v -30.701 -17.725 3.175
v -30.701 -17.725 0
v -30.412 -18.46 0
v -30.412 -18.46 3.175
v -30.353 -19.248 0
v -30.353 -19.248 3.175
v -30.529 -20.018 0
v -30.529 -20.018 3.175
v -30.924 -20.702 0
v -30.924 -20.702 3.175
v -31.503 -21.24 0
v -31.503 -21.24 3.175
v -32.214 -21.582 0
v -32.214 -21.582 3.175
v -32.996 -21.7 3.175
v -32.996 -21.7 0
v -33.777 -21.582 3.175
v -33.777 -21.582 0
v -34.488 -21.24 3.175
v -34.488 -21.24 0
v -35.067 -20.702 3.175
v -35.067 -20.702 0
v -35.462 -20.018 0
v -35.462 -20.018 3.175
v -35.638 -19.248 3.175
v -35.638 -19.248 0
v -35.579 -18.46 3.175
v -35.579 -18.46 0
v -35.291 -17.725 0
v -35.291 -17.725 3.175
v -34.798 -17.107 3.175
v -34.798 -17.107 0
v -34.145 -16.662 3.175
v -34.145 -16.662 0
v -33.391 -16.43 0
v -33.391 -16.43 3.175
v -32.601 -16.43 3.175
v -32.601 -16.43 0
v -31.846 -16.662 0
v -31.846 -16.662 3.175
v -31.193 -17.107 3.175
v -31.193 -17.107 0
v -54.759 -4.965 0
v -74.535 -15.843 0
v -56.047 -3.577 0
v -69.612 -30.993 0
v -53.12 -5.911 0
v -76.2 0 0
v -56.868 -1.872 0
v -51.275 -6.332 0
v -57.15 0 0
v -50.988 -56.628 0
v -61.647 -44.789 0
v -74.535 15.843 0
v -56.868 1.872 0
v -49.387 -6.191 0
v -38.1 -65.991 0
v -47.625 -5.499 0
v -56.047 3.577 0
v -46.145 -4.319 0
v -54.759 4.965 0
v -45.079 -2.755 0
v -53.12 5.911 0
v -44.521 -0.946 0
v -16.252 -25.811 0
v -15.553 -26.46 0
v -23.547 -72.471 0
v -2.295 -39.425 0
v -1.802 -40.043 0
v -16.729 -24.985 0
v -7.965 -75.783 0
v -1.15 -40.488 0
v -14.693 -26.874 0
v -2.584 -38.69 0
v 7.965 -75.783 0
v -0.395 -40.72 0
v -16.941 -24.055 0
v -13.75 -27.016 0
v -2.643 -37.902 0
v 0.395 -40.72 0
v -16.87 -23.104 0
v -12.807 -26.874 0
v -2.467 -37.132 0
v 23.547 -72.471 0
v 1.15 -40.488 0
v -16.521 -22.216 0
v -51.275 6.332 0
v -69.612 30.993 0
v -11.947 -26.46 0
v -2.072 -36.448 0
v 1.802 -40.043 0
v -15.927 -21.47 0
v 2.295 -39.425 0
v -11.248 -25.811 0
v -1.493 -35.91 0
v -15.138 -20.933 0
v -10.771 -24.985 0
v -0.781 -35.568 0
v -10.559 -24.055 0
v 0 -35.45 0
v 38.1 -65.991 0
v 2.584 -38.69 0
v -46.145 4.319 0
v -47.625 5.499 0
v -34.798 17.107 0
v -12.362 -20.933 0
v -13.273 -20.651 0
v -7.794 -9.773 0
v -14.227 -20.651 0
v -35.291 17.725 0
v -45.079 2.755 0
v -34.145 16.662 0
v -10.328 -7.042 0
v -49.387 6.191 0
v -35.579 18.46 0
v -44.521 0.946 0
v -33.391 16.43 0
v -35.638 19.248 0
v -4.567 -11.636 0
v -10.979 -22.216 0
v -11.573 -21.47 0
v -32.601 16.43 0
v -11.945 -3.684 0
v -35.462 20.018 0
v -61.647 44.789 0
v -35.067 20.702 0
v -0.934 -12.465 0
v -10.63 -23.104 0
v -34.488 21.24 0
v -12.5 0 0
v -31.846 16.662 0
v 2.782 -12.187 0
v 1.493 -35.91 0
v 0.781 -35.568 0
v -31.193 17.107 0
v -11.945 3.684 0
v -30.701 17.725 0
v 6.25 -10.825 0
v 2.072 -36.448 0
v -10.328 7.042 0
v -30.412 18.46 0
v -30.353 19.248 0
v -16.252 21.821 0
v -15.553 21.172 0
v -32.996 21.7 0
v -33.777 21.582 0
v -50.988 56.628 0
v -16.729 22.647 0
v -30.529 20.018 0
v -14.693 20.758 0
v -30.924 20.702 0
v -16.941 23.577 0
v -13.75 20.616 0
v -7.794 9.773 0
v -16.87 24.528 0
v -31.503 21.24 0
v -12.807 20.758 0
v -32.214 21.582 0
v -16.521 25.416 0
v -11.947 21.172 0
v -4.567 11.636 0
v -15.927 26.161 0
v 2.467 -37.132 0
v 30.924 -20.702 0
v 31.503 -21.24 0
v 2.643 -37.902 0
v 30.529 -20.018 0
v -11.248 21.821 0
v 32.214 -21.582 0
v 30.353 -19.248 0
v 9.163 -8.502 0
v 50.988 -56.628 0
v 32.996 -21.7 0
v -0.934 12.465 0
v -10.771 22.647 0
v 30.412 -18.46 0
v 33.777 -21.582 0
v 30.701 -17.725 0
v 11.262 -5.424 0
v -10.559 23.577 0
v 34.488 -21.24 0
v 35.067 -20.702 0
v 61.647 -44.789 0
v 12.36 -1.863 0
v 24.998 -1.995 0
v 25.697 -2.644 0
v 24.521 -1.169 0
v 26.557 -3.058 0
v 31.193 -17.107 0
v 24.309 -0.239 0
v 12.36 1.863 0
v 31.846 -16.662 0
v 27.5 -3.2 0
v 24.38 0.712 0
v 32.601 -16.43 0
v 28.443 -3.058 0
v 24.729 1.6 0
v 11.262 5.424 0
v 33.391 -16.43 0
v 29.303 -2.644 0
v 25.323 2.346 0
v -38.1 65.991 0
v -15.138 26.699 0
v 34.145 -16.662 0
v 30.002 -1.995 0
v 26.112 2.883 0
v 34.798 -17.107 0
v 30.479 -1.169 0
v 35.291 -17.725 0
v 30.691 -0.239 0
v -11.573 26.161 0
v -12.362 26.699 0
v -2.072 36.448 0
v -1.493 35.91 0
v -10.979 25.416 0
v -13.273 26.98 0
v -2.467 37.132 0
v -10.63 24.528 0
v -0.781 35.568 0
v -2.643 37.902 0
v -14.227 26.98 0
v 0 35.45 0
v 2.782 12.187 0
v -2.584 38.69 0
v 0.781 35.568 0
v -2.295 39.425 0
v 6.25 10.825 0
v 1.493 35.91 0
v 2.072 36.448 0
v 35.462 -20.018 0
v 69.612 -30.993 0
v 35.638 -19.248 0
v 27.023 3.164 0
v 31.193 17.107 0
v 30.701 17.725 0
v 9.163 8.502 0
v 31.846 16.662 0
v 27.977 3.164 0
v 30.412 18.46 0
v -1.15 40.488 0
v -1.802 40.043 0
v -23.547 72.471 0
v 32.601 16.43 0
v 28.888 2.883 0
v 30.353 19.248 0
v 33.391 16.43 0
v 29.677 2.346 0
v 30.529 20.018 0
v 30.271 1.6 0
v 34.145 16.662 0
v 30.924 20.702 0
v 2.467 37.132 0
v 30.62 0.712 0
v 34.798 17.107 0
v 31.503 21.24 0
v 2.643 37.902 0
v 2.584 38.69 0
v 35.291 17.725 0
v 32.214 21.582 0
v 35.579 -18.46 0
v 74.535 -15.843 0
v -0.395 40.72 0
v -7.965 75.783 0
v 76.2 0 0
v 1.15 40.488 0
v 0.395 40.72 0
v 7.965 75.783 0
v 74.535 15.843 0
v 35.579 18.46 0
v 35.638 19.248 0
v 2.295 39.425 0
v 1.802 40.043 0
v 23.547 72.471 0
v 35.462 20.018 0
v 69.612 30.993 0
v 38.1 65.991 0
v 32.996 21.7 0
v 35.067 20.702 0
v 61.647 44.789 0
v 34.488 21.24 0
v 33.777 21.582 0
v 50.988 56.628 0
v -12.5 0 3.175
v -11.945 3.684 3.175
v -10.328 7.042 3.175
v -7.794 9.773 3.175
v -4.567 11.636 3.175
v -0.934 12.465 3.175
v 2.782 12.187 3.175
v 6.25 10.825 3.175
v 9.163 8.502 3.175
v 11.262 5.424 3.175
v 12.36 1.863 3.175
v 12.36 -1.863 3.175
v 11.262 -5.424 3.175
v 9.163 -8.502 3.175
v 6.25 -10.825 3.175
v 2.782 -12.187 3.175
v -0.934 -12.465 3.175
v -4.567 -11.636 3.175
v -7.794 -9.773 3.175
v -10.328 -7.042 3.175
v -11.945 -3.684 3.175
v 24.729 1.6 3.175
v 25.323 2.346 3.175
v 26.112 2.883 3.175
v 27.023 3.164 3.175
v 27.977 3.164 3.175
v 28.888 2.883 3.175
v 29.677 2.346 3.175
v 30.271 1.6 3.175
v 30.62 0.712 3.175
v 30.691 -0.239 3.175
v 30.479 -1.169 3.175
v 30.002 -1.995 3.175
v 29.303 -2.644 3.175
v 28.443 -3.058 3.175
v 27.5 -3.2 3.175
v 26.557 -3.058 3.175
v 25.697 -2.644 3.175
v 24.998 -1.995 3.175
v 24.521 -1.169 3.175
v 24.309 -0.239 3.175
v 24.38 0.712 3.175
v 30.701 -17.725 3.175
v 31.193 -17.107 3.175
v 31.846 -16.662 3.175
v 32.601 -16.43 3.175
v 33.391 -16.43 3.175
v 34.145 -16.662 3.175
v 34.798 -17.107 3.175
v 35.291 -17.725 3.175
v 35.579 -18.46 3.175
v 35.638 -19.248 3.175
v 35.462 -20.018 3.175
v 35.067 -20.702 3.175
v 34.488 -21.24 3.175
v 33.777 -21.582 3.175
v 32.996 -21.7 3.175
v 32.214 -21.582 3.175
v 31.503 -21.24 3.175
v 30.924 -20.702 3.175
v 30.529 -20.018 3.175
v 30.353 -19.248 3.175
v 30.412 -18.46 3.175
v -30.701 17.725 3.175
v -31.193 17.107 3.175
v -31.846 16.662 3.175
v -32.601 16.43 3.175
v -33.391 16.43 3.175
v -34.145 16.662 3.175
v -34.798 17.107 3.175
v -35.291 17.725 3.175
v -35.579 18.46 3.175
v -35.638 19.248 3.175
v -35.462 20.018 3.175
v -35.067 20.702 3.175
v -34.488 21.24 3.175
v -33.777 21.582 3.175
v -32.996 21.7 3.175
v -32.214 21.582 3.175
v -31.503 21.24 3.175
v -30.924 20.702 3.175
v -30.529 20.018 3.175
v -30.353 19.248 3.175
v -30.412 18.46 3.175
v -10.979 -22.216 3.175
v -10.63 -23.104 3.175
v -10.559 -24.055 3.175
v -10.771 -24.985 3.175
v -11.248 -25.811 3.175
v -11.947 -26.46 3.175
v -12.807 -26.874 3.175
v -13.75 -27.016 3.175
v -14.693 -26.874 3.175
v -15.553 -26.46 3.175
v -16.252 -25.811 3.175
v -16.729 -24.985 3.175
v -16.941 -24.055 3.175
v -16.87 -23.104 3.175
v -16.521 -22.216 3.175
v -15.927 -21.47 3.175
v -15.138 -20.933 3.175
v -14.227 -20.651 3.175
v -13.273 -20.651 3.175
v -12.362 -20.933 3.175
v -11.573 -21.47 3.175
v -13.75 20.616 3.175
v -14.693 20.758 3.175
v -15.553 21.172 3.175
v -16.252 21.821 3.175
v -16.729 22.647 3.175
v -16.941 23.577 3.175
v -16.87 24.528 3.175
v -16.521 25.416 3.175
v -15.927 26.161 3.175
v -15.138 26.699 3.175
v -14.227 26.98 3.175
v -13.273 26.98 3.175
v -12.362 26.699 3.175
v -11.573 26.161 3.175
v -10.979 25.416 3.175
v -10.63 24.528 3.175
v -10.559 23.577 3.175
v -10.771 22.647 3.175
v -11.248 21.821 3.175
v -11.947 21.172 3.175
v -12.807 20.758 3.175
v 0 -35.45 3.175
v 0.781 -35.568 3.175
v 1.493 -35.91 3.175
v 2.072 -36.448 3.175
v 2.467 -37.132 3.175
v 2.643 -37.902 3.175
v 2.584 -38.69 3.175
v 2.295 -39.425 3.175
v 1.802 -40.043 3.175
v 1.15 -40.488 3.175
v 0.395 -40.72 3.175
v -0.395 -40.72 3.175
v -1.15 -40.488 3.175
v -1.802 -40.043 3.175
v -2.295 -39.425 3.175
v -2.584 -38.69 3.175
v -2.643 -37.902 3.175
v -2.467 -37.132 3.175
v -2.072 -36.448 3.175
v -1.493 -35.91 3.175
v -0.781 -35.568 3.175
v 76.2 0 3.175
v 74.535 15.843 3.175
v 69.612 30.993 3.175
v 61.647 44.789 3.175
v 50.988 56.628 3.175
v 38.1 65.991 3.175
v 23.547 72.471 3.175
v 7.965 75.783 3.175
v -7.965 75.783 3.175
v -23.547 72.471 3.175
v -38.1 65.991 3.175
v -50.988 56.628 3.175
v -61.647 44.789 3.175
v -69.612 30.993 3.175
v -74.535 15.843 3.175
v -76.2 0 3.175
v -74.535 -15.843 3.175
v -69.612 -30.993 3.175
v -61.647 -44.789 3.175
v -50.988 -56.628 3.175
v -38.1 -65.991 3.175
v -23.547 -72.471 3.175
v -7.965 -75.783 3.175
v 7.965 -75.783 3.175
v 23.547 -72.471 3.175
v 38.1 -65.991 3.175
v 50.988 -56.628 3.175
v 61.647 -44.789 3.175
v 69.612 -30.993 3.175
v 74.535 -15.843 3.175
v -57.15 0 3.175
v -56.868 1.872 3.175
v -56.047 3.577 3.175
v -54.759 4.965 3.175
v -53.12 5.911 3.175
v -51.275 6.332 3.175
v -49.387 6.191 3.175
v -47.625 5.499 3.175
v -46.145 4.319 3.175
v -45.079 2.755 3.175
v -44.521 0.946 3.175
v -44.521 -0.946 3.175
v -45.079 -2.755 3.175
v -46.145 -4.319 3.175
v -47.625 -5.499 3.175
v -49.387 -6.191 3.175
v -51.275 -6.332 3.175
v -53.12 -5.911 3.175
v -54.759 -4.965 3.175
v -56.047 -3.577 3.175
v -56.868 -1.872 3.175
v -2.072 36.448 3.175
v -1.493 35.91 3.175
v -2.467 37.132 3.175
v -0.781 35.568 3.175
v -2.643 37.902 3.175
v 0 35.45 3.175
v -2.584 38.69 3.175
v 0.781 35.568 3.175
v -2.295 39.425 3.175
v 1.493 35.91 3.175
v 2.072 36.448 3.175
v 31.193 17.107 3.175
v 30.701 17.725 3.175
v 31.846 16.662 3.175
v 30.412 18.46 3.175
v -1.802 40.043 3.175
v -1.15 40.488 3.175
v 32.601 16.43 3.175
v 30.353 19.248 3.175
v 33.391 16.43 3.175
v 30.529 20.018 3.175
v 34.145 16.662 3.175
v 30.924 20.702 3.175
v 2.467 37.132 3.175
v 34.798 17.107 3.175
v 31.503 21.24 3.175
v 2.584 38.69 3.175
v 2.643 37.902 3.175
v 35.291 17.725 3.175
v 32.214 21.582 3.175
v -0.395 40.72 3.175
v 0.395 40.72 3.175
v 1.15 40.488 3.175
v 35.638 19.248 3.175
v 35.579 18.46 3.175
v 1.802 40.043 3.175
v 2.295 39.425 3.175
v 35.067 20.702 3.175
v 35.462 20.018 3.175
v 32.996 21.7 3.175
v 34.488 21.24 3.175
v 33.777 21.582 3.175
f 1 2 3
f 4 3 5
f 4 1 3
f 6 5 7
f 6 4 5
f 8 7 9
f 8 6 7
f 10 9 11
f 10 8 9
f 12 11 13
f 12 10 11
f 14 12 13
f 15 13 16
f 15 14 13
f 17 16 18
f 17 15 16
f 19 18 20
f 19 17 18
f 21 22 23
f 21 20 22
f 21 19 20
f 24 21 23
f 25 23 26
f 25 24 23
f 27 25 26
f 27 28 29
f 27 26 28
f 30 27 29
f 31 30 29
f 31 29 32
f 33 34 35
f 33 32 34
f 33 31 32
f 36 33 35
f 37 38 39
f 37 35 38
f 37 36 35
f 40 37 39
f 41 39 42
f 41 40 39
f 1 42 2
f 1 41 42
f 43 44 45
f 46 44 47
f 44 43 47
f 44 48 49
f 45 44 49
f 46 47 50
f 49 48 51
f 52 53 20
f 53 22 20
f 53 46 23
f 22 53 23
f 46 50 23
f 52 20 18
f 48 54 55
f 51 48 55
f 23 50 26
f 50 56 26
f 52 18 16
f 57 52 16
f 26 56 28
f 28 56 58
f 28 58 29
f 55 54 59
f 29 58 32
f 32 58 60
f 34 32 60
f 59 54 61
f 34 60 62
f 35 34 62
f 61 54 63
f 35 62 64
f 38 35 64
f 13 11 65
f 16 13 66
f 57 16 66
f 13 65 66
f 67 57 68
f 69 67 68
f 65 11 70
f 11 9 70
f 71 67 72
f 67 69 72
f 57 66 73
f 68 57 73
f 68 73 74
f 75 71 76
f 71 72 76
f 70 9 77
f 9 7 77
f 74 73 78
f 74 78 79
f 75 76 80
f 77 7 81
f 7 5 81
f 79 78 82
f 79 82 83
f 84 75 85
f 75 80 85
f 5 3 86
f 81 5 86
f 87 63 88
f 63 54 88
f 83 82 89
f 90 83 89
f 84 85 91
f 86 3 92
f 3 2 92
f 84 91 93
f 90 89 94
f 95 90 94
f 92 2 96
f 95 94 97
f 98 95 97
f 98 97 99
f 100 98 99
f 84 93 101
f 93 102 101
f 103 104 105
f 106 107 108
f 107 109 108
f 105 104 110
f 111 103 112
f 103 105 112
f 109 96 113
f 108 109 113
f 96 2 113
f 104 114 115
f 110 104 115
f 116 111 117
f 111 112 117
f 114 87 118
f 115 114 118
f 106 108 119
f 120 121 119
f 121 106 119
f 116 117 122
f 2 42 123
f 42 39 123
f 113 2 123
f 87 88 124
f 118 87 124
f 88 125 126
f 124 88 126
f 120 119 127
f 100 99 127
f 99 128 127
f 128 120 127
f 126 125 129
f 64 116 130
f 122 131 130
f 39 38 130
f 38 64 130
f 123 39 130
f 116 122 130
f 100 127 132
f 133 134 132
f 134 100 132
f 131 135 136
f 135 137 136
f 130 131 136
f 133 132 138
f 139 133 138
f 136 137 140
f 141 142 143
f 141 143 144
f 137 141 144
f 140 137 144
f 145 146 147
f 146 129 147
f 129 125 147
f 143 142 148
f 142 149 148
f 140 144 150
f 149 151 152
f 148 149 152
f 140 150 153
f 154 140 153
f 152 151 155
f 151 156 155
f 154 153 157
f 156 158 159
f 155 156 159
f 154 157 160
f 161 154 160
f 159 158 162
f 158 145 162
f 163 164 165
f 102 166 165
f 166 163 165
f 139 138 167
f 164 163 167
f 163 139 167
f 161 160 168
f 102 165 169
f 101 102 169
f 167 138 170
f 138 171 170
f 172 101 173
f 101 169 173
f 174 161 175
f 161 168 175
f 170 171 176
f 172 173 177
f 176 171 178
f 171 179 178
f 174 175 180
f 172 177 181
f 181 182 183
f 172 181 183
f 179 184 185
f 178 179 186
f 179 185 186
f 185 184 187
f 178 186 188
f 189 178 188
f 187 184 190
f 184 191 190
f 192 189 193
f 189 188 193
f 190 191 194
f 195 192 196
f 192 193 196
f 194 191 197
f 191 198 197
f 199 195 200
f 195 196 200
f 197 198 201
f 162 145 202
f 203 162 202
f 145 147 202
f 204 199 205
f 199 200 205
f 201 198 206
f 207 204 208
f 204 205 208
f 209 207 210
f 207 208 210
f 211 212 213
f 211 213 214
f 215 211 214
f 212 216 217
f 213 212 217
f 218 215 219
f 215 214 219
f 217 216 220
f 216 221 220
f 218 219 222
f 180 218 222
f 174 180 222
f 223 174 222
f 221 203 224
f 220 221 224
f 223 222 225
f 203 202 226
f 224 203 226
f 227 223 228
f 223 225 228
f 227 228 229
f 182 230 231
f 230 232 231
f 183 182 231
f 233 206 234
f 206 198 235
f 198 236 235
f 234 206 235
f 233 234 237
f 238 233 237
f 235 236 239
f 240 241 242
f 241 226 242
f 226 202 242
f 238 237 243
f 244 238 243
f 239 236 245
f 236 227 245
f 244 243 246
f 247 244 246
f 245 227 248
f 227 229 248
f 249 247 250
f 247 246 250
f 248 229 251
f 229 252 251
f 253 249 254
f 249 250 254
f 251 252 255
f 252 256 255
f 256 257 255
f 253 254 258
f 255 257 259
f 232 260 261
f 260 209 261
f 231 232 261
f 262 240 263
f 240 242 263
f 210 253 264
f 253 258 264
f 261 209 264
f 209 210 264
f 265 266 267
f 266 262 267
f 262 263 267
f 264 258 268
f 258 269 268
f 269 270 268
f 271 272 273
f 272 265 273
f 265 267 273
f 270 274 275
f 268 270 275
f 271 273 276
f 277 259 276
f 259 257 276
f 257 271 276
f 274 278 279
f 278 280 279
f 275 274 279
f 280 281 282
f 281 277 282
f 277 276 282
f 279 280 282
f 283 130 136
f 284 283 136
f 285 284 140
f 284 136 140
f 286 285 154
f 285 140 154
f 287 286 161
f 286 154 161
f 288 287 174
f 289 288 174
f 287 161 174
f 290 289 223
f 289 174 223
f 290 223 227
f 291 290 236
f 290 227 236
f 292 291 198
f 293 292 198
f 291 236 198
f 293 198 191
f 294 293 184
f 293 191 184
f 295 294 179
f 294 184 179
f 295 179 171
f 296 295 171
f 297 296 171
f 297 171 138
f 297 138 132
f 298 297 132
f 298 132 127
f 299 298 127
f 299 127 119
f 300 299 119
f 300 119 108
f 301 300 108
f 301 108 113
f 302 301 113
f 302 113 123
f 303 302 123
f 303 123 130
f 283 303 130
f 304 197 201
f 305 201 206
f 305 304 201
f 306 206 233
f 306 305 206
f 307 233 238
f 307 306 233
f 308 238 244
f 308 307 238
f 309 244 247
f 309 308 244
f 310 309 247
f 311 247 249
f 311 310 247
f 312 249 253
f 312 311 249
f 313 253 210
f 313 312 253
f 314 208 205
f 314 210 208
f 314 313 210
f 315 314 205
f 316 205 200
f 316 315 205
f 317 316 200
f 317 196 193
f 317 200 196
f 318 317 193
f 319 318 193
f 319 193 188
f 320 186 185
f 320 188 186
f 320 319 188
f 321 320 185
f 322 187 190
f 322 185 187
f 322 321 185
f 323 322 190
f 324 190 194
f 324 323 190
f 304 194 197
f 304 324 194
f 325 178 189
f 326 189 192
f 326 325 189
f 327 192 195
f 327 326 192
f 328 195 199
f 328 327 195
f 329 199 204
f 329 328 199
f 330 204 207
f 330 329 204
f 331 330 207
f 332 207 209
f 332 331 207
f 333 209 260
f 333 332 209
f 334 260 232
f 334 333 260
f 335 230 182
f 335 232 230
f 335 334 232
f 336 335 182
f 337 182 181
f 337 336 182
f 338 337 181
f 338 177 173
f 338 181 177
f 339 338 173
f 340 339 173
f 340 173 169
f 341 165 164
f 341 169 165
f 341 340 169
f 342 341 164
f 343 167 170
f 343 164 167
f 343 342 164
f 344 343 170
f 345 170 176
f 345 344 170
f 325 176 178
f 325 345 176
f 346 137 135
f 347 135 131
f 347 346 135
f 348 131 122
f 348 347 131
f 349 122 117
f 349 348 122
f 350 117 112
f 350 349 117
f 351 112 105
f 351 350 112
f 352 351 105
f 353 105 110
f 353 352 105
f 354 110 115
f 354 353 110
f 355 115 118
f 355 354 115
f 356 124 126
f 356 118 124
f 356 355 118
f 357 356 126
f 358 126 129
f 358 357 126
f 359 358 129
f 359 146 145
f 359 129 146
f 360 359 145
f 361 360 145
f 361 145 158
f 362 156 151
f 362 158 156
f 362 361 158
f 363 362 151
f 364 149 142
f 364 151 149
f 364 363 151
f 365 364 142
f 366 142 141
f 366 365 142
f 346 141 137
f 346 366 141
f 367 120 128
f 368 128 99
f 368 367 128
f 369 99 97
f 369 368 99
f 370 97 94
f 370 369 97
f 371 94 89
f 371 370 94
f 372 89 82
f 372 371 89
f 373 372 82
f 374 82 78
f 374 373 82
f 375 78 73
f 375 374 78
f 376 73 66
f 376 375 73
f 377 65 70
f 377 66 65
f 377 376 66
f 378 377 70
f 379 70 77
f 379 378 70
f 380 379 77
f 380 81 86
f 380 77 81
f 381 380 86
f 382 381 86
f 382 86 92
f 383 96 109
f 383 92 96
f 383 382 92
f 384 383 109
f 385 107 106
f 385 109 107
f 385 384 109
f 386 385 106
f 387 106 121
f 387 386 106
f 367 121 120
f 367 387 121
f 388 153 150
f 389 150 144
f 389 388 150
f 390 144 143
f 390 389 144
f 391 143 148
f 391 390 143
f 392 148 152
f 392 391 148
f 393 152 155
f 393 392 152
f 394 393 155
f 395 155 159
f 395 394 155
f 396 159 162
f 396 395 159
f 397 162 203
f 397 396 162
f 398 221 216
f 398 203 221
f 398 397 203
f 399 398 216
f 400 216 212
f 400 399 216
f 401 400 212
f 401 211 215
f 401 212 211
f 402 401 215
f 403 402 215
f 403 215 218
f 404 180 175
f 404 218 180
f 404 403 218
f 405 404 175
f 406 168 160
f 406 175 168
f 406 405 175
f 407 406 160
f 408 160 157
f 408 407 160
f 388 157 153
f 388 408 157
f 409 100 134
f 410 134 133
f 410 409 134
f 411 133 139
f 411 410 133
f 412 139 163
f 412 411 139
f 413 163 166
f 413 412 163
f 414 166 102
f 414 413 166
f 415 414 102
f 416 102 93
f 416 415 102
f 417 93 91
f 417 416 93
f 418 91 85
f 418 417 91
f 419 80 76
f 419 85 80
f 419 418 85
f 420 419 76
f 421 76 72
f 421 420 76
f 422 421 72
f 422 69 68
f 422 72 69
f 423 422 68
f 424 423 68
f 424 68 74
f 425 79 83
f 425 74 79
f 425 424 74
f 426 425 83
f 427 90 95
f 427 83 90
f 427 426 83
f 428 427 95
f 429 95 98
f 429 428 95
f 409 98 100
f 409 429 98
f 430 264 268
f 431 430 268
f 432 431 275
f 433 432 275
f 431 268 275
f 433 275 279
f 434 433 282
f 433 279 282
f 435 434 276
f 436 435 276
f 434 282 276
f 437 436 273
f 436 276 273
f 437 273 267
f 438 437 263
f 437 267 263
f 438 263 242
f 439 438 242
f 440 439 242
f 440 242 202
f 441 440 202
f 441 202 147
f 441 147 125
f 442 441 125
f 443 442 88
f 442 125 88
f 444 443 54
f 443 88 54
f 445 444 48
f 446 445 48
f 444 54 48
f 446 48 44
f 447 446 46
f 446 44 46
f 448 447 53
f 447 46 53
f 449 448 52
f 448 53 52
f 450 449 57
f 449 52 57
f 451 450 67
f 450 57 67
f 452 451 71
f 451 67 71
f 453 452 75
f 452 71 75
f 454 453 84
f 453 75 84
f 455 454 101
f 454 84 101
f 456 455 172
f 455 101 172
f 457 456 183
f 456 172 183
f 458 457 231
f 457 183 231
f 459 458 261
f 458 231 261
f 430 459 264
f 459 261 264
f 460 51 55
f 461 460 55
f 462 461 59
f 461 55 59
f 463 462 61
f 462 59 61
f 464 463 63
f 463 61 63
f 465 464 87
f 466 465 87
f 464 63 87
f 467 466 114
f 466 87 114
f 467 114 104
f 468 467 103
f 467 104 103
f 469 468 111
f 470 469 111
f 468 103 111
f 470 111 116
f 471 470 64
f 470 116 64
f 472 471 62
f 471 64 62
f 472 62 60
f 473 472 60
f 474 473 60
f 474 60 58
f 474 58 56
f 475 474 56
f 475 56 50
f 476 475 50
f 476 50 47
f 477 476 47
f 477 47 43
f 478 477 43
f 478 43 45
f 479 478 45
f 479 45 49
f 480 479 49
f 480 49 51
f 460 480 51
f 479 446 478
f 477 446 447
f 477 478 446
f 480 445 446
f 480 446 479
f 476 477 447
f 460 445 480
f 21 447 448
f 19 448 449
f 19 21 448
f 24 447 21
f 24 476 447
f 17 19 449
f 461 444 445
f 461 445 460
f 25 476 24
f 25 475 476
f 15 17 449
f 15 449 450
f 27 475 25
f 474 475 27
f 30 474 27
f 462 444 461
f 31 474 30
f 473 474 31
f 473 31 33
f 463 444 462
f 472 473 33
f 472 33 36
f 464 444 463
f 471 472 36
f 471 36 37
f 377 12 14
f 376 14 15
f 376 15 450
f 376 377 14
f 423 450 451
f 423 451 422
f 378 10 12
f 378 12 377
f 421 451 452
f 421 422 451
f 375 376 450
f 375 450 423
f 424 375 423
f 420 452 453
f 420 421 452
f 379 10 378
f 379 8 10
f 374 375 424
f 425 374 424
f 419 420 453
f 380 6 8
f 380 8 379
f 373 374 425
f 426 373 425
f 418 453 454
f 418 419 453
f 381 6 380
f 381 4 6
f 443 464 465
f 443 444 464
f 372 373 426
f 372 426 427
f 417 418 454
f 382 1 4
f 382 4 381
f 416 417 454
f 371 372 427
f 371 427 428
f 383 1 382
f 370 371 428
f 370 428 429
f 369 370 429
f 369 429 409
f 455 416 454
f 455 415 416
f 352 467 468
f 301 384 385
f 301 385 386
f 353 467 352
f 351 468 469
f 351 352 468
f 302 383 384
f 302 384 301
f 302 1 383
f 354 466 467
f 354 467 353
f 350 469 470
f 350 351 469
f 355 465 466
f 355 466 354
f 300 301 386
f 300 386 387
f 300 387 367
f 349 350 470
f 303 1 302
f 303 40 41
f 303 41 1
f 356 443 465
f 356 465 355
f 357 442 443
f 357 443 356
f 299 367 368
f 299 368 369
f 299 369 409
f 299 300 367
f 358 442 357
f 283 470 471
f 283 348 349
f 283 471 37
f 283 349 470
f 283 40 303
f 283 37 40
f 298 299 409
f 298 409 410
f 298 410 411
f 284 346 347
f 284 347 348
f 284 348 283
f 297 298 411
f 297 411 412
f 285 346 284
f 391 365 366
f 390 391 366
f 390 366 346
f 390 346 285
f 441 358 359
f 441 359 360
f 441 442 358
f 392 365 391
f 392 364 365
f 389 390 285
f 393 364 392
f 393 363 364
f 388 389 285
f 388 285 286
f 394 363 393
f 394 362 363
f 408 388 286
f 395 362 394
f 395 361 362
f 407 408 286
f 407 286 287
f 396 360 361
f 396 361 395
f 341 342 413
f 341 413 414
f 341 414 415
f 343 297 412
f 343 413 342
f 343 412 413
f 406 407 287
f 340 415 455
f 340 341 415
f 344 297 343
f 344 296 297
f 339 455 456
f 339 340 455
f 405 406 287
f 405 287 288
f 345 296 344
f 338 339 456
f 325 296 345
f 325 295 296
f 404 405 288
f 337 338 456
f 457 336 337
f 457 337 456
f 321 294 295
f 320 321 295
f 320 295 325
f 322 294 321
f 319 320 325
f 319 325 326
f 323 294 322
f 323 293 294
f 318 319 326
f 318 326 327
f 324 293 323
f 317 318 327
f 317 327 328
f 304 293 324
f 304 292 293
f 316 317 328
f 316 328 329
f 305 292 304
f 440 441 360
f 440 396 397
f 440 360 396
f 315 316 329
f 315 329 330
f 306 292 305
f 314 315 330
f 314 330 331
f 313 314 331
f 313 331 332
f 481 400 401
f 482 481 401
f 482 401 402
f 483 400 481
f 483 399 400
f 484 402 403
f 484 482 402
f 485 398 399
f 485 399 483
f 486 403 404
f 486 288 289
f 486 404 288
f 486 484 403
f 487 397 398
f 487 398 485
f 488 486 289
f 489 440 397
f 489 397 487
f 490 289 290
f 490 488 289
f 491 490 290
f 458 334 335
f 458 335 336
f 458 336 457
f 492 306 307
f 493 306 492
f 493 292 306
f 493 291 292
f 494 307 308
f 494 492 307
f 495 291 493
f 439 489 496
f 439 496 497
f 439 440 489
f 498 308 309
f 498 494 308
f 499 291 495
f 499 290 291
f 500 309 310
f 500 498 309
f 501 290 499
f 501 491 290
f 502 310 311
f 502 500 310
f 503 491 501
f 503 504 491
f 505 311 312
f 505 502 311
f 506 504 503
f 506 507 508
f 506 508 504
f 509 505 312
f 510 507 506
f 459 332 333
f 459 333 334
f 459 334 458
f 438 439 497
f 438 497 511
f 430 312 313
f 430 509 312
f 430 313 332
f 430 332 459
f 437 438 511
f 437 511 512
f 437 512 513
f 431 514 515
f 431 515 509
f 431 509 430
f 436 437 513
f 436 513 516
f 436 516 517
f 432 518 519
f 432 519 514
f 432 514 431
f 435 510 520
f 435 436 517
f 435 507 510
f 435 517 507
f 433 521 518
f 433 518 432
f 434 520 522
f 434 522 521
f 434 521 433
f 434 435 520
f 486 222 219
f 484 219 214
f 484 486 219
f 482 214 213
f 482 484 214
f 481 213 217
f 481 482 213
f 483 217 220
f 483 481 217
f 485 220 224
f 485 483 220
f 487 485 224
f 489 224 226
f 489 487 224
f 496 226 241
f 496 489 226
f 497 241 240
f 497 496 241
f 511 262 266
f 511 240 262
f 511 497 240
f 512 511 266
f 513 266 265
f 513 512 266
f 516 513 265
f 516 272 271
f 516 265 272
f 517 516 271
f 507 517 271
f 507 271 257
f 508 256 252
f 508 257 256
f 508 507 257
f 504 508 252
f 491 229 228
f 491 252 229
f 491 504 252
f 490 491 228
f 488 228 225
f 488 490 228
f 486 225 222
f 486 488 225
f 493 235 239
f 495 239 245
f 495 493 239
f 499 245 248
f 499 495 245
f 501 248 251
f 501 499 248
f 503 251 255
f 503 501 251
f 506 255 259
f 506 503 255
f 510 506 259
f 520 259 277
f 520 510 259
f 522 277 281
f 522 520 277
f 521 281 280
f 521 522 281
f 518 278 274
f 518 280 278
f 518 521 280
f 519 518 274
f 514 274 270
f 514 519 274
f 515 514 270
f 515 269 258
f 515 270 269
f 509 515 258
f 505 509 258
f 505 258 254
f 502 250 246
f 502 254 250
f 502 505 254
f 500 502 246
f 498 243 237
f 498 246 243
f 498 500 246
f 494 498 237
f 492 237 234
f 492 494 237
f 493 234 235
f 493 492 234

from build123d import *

# Parameters (mm, degrees)
SKETCH1_R           = 76.2
BOSS_EXTRUDE1_DEPTH = 3.175
CIRPATTERN1_COUNT   = 3
CIRPATTERN2_COUNT   = 6
SKETCH7_R           = 12.5
CUT_EXTRUDE2_DEPTH  = 4.175
SKETCH8_R           = 6.35
CUT_EXTRUDE3_DEPTH  = 4.175


with BuildPart() as part:
    # Sketch1 → Boss-Extrude1 (new body)
    with BuildSketch(Plane.XY):
        Circle(SKETCH1_R)
    extrude(amount=BOSS_EXTRUDE1_DEPTH)

    # Sketch4 → M5 Clearance Hole2 (revolve, cut)
    with BuildSketch(Plane(origin=(0, 38.1, 3.175), x_dir=(0, -1, 0), z_dir=(1, 0, 0))):
        Polygon((0, 0), (0, 14.03828064), (2.65, 12.446), (2.65, 0), align=None)
    m5_clearance_hole2 = revolve(axis=Axis((0, 38.1, 9.525), (0, 0, -1)), mode=Mode.SUBTRACT)

    # Sketch5 → M6 Clearance Hole1 (revolve, cut)
    with BuildSketch(Plane(origin=(-13.75, 23.815698604, 3.175), x_dir=(0, -1, 0), z_dir=(1, 0, 0))):
        Polygon((0, 0), (0, 14.368753981), (3.2, 12.446), (3.2, 0), align=None)
    m6_clearance_hole1 = revolve(axis=Axis((-13.75, 23.815698604, 9.525), (0, 0, -1)), mode=Mode.SUBTRACT)

    # CirPattern1: M6 Clearance Hole1 ×3 about axis
    cirpattern1_axis = Axis((0, 0, 0), (0, 0, 1))
    for i in range(1, CIRPATTERN1_COUNT):
        add(m6_clearance_hole1.rotate(cirpattern1_axis, i * 360 / CIRPATTERN1_COUNT), mode=Mode.SUBTRACT)

    # CirPattern2: M5 Clearance Hole2 ×6 about axis
    cirpattern2_axis = Axis((0, 0, 0), (0, 0, 1))
    for i in range(1, CIRPATTERN2_COUNT):
        add(m5_clearance_hole2.rotate(cirpattern2_axis, i * 360 / CIRPATTERN2_COUNT), mode=Mode.SUBTRACT)

    # Sketch7 → Cut-Extrude2 (cut, through all)
    with BuildSketch(Plane(origin=(0, 0, 0), x_dir=(-1, 0, 0), z_dir=(0, 0, -1))):
        Circle(SKETCH7_R)
    extrude(amount=-CUT_EXTRUDE2_DEPTH, mode=Mode.SUBTRACT)

    # Sketch8 → Cut-Extrude3 (cut, through all)
    with BuildSketch(Plane(origin=(0, 0, 0), x_dir=(-1, 0, 0), z_dir=(0, 0, -1))):
        with Locations((50.8, 0)):
            Circle(SKETCH8_R)
    extrude(amount=-CUT_EXTRUDE3_DEPTH, mode=Mode.SUBTRACT)


solid = part.part
